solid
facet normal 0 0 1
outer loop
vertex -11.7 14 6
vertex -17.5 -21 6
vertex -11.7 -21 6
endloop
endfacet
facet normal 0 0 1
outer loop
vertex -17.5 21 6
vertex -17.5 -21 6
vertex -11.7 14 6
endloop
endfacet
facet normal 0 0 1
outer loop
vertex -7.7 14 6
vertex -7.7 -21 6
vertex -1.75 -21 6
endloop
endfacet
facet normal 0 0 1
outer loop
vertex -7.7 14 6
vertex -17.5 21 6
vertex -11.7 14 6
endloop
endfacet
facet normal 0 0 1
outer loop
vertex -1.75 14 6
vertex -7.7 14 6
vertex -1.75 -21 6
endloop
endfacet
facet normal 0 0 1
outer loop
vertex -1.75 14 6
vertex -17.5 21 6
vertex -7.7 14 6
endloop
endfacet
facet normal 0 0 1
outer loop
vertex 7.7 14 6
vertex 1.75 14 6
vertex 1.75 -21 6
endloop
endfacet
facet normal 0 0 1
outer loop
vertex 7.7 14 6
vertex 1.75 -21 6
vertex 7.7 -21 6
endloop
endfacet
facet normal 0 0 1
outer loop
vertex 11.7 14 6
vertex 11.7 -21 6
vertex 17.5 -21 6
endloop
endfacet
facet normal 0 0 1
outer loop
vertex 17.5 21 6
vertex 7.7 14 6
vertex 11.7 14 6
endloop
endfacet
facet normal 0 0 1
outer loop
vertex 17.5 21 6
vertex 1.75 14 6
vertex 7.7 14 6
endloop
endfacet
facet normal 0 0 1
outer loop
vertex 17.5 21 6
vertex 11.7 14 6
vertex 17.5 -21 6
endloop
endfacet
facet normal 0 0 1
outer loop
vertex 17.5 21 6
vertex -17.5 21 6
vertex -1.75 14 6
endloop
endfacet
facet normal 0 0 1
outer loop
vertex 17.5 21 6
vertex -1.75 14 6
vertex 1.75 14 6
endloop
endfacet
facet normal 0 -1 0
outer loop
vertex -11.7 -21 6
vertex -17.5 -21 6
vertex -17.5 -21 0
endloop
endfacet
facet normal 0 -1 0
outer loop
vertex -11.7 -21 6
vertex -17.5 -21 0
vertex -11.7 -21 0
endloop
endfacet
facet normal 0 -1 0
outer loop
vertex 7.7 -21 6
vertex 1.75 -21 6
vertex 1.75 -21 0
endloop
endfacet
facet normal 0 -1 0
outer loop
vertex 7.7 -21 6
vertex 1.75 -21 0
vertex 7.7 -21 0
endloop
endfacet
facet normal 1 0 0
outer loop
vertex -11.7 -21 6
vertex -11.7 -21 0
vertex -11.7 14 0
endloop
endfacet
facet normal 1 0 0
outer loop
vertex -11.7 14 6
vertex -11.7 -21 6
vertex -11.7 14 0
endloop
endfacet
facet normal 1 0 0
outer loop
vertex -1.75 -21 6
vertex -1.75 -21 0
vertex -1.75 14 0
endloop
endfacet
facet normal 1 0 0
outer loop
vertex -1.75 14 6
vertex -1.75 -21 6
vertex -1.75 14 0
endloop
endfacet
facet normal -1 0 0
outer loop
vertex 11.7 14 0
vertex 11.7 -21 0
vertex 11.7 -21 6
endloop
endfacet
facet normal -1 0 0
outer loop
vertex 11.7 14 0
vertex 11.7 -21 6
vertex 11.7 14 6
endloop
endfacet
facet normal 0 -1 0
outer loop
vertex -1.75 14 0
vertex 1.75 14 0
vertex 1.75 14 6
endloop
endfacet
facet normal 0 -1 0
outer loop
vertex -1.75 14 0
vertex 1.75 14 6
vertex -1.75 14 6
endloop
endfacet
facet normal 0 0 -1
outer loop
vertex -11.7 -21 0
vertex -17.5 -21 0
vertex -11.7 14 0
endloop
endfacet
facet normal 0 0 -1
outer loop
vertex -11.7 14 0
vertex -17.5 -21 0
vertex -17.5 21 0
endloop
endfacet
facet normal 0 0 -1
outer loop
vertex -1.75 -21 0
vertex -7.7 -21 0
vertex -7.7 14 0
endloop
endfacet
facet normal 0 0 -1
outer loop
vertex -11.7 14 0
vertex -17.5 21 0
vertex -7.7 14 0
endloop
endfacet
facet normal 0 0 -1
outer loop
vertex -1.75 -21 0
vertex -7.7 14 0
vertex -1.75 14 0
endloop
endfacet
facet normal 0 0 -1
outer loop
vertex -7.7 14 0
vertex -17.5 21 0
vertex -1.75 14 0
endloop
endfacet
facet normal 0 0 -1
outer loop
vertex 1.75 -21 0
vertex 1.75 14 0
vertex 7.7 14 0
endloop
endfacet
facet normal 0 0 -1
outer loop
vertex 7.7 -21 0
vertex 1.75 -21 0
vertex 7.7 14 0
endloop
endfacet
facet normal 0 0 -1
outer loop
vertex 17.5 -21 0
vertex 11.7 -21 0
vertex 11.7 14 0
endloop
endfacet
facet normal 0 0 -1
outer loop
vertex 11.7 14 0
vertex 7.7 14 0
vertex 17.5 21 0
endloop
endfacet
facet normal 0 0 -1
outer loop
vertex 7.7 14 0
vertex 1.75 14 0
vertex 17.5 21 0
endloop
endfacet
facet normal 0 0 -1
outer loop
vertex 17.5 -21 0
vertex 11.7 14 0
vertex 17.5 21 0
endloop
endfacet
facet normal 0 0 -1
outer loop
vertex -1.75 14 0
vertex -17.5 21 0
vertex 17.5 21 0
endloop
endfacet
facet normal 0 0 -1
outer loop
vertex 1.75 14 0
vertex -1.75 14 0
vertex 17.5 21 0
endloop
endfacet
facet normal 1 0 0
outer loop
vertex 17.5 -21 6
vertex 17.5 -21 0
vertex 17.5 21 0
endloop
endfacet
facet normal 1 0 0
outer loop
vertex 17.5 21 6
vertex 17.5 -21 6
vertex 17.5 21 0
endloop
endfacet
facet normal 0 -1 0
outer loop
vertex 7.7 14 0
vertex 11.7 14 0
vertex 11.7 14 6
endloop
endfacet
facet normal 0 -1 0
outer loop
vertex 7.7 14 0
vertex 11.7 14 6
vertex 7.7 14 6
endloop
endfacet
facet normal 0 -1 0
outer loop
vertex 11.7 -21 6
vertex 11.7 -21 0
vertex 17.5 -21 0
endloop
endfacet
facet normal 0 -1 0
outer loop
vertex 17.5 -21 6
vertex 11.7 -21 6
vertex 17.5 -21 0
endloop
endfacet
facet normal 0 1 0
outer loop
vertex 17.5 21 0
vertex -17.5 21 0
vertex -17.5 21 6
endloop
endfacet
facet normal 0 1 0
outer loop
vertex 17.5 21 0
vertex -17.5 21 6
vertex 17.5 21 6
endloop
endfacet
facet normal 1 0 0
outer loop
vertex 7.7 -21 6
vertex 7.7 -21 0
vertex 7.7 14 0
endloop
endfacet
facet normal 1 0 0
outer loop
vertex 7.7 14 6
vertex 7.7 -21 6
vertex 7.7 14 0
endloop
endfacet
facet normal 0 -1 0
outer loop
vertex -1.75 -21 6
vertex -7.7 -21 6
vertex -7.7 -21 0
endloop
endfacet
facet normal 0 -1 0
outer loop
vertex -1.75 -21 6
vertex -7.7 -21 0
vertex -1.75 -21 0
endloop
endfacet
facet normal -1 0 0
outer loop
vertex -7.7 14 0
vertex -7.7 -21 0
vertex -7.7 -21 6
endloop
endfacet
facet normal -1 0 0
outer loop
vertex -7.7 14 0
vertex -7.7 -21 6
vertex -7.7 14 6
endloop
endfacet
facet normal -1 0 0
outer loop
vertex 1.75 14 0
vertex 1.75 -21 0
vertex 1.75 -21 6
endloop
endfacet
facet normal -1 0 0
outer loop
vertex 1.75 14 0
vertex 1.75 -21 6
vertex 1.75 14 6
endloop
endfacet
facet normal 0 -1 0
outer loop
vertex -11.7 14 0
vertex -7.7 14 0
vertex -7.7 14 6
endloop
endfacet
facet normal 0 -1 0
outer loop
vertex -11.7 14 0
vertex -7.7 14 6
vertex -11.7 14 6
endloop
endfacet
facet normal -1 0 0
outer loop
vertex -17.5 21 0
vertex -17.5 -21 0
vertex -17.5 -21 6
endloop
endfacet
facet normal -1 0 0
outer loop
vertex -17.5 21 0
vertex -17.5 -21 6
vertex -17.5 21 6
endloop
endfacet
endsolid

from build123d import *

# Parameters (mm, degrees)
ESQUISSE1_W             = 35
ESQUISSE1_H             = 42
BOSS_EXTRU_1_DEPTH      = 6
ESQUISSE2_W             = 4
ESQUISSE2_H             = 35
ESQUISSE2_W_2           = 3.5
ENL_V_MAT_EXTRU_1_DEPTH = 6


with BuildPart() as part:
    # Esquisse1 → Boss.-Extru.1 (new body)
    with BuildSketch(Plane.XY):
        Rectangle(ESQUISSE1_W, ESQUISSE1_H)
    extrude(amount=BOSS_EXTRU_1_DEPTH)

    # Esquisse2 → Enlèv. mat.-Extru.1 (cut)
    with BuildSketch(Plane(origin=(0, 0, 0), x_dir=(-1, 0, 0), z_dir=(0, 0, -1))):
        with Locations((-9.7, -3.5)):
            Rectangle(ESQUISSE2_W, ESQUISSE2_H)
        with Locations((9.7, -3.5)):
            Rectangle(ESQUISSE2_W, ESQUISSE2_H)
        with Locations((0, -3.5)):
            Rectangle(ESQUISSE2_W_2, ESQUISSE2_H)
    extrude(amount=-ENL_V_MAT_EXTRU_1_DEPTH, mode=Mode.SUBTRACT)


solid = part.part
